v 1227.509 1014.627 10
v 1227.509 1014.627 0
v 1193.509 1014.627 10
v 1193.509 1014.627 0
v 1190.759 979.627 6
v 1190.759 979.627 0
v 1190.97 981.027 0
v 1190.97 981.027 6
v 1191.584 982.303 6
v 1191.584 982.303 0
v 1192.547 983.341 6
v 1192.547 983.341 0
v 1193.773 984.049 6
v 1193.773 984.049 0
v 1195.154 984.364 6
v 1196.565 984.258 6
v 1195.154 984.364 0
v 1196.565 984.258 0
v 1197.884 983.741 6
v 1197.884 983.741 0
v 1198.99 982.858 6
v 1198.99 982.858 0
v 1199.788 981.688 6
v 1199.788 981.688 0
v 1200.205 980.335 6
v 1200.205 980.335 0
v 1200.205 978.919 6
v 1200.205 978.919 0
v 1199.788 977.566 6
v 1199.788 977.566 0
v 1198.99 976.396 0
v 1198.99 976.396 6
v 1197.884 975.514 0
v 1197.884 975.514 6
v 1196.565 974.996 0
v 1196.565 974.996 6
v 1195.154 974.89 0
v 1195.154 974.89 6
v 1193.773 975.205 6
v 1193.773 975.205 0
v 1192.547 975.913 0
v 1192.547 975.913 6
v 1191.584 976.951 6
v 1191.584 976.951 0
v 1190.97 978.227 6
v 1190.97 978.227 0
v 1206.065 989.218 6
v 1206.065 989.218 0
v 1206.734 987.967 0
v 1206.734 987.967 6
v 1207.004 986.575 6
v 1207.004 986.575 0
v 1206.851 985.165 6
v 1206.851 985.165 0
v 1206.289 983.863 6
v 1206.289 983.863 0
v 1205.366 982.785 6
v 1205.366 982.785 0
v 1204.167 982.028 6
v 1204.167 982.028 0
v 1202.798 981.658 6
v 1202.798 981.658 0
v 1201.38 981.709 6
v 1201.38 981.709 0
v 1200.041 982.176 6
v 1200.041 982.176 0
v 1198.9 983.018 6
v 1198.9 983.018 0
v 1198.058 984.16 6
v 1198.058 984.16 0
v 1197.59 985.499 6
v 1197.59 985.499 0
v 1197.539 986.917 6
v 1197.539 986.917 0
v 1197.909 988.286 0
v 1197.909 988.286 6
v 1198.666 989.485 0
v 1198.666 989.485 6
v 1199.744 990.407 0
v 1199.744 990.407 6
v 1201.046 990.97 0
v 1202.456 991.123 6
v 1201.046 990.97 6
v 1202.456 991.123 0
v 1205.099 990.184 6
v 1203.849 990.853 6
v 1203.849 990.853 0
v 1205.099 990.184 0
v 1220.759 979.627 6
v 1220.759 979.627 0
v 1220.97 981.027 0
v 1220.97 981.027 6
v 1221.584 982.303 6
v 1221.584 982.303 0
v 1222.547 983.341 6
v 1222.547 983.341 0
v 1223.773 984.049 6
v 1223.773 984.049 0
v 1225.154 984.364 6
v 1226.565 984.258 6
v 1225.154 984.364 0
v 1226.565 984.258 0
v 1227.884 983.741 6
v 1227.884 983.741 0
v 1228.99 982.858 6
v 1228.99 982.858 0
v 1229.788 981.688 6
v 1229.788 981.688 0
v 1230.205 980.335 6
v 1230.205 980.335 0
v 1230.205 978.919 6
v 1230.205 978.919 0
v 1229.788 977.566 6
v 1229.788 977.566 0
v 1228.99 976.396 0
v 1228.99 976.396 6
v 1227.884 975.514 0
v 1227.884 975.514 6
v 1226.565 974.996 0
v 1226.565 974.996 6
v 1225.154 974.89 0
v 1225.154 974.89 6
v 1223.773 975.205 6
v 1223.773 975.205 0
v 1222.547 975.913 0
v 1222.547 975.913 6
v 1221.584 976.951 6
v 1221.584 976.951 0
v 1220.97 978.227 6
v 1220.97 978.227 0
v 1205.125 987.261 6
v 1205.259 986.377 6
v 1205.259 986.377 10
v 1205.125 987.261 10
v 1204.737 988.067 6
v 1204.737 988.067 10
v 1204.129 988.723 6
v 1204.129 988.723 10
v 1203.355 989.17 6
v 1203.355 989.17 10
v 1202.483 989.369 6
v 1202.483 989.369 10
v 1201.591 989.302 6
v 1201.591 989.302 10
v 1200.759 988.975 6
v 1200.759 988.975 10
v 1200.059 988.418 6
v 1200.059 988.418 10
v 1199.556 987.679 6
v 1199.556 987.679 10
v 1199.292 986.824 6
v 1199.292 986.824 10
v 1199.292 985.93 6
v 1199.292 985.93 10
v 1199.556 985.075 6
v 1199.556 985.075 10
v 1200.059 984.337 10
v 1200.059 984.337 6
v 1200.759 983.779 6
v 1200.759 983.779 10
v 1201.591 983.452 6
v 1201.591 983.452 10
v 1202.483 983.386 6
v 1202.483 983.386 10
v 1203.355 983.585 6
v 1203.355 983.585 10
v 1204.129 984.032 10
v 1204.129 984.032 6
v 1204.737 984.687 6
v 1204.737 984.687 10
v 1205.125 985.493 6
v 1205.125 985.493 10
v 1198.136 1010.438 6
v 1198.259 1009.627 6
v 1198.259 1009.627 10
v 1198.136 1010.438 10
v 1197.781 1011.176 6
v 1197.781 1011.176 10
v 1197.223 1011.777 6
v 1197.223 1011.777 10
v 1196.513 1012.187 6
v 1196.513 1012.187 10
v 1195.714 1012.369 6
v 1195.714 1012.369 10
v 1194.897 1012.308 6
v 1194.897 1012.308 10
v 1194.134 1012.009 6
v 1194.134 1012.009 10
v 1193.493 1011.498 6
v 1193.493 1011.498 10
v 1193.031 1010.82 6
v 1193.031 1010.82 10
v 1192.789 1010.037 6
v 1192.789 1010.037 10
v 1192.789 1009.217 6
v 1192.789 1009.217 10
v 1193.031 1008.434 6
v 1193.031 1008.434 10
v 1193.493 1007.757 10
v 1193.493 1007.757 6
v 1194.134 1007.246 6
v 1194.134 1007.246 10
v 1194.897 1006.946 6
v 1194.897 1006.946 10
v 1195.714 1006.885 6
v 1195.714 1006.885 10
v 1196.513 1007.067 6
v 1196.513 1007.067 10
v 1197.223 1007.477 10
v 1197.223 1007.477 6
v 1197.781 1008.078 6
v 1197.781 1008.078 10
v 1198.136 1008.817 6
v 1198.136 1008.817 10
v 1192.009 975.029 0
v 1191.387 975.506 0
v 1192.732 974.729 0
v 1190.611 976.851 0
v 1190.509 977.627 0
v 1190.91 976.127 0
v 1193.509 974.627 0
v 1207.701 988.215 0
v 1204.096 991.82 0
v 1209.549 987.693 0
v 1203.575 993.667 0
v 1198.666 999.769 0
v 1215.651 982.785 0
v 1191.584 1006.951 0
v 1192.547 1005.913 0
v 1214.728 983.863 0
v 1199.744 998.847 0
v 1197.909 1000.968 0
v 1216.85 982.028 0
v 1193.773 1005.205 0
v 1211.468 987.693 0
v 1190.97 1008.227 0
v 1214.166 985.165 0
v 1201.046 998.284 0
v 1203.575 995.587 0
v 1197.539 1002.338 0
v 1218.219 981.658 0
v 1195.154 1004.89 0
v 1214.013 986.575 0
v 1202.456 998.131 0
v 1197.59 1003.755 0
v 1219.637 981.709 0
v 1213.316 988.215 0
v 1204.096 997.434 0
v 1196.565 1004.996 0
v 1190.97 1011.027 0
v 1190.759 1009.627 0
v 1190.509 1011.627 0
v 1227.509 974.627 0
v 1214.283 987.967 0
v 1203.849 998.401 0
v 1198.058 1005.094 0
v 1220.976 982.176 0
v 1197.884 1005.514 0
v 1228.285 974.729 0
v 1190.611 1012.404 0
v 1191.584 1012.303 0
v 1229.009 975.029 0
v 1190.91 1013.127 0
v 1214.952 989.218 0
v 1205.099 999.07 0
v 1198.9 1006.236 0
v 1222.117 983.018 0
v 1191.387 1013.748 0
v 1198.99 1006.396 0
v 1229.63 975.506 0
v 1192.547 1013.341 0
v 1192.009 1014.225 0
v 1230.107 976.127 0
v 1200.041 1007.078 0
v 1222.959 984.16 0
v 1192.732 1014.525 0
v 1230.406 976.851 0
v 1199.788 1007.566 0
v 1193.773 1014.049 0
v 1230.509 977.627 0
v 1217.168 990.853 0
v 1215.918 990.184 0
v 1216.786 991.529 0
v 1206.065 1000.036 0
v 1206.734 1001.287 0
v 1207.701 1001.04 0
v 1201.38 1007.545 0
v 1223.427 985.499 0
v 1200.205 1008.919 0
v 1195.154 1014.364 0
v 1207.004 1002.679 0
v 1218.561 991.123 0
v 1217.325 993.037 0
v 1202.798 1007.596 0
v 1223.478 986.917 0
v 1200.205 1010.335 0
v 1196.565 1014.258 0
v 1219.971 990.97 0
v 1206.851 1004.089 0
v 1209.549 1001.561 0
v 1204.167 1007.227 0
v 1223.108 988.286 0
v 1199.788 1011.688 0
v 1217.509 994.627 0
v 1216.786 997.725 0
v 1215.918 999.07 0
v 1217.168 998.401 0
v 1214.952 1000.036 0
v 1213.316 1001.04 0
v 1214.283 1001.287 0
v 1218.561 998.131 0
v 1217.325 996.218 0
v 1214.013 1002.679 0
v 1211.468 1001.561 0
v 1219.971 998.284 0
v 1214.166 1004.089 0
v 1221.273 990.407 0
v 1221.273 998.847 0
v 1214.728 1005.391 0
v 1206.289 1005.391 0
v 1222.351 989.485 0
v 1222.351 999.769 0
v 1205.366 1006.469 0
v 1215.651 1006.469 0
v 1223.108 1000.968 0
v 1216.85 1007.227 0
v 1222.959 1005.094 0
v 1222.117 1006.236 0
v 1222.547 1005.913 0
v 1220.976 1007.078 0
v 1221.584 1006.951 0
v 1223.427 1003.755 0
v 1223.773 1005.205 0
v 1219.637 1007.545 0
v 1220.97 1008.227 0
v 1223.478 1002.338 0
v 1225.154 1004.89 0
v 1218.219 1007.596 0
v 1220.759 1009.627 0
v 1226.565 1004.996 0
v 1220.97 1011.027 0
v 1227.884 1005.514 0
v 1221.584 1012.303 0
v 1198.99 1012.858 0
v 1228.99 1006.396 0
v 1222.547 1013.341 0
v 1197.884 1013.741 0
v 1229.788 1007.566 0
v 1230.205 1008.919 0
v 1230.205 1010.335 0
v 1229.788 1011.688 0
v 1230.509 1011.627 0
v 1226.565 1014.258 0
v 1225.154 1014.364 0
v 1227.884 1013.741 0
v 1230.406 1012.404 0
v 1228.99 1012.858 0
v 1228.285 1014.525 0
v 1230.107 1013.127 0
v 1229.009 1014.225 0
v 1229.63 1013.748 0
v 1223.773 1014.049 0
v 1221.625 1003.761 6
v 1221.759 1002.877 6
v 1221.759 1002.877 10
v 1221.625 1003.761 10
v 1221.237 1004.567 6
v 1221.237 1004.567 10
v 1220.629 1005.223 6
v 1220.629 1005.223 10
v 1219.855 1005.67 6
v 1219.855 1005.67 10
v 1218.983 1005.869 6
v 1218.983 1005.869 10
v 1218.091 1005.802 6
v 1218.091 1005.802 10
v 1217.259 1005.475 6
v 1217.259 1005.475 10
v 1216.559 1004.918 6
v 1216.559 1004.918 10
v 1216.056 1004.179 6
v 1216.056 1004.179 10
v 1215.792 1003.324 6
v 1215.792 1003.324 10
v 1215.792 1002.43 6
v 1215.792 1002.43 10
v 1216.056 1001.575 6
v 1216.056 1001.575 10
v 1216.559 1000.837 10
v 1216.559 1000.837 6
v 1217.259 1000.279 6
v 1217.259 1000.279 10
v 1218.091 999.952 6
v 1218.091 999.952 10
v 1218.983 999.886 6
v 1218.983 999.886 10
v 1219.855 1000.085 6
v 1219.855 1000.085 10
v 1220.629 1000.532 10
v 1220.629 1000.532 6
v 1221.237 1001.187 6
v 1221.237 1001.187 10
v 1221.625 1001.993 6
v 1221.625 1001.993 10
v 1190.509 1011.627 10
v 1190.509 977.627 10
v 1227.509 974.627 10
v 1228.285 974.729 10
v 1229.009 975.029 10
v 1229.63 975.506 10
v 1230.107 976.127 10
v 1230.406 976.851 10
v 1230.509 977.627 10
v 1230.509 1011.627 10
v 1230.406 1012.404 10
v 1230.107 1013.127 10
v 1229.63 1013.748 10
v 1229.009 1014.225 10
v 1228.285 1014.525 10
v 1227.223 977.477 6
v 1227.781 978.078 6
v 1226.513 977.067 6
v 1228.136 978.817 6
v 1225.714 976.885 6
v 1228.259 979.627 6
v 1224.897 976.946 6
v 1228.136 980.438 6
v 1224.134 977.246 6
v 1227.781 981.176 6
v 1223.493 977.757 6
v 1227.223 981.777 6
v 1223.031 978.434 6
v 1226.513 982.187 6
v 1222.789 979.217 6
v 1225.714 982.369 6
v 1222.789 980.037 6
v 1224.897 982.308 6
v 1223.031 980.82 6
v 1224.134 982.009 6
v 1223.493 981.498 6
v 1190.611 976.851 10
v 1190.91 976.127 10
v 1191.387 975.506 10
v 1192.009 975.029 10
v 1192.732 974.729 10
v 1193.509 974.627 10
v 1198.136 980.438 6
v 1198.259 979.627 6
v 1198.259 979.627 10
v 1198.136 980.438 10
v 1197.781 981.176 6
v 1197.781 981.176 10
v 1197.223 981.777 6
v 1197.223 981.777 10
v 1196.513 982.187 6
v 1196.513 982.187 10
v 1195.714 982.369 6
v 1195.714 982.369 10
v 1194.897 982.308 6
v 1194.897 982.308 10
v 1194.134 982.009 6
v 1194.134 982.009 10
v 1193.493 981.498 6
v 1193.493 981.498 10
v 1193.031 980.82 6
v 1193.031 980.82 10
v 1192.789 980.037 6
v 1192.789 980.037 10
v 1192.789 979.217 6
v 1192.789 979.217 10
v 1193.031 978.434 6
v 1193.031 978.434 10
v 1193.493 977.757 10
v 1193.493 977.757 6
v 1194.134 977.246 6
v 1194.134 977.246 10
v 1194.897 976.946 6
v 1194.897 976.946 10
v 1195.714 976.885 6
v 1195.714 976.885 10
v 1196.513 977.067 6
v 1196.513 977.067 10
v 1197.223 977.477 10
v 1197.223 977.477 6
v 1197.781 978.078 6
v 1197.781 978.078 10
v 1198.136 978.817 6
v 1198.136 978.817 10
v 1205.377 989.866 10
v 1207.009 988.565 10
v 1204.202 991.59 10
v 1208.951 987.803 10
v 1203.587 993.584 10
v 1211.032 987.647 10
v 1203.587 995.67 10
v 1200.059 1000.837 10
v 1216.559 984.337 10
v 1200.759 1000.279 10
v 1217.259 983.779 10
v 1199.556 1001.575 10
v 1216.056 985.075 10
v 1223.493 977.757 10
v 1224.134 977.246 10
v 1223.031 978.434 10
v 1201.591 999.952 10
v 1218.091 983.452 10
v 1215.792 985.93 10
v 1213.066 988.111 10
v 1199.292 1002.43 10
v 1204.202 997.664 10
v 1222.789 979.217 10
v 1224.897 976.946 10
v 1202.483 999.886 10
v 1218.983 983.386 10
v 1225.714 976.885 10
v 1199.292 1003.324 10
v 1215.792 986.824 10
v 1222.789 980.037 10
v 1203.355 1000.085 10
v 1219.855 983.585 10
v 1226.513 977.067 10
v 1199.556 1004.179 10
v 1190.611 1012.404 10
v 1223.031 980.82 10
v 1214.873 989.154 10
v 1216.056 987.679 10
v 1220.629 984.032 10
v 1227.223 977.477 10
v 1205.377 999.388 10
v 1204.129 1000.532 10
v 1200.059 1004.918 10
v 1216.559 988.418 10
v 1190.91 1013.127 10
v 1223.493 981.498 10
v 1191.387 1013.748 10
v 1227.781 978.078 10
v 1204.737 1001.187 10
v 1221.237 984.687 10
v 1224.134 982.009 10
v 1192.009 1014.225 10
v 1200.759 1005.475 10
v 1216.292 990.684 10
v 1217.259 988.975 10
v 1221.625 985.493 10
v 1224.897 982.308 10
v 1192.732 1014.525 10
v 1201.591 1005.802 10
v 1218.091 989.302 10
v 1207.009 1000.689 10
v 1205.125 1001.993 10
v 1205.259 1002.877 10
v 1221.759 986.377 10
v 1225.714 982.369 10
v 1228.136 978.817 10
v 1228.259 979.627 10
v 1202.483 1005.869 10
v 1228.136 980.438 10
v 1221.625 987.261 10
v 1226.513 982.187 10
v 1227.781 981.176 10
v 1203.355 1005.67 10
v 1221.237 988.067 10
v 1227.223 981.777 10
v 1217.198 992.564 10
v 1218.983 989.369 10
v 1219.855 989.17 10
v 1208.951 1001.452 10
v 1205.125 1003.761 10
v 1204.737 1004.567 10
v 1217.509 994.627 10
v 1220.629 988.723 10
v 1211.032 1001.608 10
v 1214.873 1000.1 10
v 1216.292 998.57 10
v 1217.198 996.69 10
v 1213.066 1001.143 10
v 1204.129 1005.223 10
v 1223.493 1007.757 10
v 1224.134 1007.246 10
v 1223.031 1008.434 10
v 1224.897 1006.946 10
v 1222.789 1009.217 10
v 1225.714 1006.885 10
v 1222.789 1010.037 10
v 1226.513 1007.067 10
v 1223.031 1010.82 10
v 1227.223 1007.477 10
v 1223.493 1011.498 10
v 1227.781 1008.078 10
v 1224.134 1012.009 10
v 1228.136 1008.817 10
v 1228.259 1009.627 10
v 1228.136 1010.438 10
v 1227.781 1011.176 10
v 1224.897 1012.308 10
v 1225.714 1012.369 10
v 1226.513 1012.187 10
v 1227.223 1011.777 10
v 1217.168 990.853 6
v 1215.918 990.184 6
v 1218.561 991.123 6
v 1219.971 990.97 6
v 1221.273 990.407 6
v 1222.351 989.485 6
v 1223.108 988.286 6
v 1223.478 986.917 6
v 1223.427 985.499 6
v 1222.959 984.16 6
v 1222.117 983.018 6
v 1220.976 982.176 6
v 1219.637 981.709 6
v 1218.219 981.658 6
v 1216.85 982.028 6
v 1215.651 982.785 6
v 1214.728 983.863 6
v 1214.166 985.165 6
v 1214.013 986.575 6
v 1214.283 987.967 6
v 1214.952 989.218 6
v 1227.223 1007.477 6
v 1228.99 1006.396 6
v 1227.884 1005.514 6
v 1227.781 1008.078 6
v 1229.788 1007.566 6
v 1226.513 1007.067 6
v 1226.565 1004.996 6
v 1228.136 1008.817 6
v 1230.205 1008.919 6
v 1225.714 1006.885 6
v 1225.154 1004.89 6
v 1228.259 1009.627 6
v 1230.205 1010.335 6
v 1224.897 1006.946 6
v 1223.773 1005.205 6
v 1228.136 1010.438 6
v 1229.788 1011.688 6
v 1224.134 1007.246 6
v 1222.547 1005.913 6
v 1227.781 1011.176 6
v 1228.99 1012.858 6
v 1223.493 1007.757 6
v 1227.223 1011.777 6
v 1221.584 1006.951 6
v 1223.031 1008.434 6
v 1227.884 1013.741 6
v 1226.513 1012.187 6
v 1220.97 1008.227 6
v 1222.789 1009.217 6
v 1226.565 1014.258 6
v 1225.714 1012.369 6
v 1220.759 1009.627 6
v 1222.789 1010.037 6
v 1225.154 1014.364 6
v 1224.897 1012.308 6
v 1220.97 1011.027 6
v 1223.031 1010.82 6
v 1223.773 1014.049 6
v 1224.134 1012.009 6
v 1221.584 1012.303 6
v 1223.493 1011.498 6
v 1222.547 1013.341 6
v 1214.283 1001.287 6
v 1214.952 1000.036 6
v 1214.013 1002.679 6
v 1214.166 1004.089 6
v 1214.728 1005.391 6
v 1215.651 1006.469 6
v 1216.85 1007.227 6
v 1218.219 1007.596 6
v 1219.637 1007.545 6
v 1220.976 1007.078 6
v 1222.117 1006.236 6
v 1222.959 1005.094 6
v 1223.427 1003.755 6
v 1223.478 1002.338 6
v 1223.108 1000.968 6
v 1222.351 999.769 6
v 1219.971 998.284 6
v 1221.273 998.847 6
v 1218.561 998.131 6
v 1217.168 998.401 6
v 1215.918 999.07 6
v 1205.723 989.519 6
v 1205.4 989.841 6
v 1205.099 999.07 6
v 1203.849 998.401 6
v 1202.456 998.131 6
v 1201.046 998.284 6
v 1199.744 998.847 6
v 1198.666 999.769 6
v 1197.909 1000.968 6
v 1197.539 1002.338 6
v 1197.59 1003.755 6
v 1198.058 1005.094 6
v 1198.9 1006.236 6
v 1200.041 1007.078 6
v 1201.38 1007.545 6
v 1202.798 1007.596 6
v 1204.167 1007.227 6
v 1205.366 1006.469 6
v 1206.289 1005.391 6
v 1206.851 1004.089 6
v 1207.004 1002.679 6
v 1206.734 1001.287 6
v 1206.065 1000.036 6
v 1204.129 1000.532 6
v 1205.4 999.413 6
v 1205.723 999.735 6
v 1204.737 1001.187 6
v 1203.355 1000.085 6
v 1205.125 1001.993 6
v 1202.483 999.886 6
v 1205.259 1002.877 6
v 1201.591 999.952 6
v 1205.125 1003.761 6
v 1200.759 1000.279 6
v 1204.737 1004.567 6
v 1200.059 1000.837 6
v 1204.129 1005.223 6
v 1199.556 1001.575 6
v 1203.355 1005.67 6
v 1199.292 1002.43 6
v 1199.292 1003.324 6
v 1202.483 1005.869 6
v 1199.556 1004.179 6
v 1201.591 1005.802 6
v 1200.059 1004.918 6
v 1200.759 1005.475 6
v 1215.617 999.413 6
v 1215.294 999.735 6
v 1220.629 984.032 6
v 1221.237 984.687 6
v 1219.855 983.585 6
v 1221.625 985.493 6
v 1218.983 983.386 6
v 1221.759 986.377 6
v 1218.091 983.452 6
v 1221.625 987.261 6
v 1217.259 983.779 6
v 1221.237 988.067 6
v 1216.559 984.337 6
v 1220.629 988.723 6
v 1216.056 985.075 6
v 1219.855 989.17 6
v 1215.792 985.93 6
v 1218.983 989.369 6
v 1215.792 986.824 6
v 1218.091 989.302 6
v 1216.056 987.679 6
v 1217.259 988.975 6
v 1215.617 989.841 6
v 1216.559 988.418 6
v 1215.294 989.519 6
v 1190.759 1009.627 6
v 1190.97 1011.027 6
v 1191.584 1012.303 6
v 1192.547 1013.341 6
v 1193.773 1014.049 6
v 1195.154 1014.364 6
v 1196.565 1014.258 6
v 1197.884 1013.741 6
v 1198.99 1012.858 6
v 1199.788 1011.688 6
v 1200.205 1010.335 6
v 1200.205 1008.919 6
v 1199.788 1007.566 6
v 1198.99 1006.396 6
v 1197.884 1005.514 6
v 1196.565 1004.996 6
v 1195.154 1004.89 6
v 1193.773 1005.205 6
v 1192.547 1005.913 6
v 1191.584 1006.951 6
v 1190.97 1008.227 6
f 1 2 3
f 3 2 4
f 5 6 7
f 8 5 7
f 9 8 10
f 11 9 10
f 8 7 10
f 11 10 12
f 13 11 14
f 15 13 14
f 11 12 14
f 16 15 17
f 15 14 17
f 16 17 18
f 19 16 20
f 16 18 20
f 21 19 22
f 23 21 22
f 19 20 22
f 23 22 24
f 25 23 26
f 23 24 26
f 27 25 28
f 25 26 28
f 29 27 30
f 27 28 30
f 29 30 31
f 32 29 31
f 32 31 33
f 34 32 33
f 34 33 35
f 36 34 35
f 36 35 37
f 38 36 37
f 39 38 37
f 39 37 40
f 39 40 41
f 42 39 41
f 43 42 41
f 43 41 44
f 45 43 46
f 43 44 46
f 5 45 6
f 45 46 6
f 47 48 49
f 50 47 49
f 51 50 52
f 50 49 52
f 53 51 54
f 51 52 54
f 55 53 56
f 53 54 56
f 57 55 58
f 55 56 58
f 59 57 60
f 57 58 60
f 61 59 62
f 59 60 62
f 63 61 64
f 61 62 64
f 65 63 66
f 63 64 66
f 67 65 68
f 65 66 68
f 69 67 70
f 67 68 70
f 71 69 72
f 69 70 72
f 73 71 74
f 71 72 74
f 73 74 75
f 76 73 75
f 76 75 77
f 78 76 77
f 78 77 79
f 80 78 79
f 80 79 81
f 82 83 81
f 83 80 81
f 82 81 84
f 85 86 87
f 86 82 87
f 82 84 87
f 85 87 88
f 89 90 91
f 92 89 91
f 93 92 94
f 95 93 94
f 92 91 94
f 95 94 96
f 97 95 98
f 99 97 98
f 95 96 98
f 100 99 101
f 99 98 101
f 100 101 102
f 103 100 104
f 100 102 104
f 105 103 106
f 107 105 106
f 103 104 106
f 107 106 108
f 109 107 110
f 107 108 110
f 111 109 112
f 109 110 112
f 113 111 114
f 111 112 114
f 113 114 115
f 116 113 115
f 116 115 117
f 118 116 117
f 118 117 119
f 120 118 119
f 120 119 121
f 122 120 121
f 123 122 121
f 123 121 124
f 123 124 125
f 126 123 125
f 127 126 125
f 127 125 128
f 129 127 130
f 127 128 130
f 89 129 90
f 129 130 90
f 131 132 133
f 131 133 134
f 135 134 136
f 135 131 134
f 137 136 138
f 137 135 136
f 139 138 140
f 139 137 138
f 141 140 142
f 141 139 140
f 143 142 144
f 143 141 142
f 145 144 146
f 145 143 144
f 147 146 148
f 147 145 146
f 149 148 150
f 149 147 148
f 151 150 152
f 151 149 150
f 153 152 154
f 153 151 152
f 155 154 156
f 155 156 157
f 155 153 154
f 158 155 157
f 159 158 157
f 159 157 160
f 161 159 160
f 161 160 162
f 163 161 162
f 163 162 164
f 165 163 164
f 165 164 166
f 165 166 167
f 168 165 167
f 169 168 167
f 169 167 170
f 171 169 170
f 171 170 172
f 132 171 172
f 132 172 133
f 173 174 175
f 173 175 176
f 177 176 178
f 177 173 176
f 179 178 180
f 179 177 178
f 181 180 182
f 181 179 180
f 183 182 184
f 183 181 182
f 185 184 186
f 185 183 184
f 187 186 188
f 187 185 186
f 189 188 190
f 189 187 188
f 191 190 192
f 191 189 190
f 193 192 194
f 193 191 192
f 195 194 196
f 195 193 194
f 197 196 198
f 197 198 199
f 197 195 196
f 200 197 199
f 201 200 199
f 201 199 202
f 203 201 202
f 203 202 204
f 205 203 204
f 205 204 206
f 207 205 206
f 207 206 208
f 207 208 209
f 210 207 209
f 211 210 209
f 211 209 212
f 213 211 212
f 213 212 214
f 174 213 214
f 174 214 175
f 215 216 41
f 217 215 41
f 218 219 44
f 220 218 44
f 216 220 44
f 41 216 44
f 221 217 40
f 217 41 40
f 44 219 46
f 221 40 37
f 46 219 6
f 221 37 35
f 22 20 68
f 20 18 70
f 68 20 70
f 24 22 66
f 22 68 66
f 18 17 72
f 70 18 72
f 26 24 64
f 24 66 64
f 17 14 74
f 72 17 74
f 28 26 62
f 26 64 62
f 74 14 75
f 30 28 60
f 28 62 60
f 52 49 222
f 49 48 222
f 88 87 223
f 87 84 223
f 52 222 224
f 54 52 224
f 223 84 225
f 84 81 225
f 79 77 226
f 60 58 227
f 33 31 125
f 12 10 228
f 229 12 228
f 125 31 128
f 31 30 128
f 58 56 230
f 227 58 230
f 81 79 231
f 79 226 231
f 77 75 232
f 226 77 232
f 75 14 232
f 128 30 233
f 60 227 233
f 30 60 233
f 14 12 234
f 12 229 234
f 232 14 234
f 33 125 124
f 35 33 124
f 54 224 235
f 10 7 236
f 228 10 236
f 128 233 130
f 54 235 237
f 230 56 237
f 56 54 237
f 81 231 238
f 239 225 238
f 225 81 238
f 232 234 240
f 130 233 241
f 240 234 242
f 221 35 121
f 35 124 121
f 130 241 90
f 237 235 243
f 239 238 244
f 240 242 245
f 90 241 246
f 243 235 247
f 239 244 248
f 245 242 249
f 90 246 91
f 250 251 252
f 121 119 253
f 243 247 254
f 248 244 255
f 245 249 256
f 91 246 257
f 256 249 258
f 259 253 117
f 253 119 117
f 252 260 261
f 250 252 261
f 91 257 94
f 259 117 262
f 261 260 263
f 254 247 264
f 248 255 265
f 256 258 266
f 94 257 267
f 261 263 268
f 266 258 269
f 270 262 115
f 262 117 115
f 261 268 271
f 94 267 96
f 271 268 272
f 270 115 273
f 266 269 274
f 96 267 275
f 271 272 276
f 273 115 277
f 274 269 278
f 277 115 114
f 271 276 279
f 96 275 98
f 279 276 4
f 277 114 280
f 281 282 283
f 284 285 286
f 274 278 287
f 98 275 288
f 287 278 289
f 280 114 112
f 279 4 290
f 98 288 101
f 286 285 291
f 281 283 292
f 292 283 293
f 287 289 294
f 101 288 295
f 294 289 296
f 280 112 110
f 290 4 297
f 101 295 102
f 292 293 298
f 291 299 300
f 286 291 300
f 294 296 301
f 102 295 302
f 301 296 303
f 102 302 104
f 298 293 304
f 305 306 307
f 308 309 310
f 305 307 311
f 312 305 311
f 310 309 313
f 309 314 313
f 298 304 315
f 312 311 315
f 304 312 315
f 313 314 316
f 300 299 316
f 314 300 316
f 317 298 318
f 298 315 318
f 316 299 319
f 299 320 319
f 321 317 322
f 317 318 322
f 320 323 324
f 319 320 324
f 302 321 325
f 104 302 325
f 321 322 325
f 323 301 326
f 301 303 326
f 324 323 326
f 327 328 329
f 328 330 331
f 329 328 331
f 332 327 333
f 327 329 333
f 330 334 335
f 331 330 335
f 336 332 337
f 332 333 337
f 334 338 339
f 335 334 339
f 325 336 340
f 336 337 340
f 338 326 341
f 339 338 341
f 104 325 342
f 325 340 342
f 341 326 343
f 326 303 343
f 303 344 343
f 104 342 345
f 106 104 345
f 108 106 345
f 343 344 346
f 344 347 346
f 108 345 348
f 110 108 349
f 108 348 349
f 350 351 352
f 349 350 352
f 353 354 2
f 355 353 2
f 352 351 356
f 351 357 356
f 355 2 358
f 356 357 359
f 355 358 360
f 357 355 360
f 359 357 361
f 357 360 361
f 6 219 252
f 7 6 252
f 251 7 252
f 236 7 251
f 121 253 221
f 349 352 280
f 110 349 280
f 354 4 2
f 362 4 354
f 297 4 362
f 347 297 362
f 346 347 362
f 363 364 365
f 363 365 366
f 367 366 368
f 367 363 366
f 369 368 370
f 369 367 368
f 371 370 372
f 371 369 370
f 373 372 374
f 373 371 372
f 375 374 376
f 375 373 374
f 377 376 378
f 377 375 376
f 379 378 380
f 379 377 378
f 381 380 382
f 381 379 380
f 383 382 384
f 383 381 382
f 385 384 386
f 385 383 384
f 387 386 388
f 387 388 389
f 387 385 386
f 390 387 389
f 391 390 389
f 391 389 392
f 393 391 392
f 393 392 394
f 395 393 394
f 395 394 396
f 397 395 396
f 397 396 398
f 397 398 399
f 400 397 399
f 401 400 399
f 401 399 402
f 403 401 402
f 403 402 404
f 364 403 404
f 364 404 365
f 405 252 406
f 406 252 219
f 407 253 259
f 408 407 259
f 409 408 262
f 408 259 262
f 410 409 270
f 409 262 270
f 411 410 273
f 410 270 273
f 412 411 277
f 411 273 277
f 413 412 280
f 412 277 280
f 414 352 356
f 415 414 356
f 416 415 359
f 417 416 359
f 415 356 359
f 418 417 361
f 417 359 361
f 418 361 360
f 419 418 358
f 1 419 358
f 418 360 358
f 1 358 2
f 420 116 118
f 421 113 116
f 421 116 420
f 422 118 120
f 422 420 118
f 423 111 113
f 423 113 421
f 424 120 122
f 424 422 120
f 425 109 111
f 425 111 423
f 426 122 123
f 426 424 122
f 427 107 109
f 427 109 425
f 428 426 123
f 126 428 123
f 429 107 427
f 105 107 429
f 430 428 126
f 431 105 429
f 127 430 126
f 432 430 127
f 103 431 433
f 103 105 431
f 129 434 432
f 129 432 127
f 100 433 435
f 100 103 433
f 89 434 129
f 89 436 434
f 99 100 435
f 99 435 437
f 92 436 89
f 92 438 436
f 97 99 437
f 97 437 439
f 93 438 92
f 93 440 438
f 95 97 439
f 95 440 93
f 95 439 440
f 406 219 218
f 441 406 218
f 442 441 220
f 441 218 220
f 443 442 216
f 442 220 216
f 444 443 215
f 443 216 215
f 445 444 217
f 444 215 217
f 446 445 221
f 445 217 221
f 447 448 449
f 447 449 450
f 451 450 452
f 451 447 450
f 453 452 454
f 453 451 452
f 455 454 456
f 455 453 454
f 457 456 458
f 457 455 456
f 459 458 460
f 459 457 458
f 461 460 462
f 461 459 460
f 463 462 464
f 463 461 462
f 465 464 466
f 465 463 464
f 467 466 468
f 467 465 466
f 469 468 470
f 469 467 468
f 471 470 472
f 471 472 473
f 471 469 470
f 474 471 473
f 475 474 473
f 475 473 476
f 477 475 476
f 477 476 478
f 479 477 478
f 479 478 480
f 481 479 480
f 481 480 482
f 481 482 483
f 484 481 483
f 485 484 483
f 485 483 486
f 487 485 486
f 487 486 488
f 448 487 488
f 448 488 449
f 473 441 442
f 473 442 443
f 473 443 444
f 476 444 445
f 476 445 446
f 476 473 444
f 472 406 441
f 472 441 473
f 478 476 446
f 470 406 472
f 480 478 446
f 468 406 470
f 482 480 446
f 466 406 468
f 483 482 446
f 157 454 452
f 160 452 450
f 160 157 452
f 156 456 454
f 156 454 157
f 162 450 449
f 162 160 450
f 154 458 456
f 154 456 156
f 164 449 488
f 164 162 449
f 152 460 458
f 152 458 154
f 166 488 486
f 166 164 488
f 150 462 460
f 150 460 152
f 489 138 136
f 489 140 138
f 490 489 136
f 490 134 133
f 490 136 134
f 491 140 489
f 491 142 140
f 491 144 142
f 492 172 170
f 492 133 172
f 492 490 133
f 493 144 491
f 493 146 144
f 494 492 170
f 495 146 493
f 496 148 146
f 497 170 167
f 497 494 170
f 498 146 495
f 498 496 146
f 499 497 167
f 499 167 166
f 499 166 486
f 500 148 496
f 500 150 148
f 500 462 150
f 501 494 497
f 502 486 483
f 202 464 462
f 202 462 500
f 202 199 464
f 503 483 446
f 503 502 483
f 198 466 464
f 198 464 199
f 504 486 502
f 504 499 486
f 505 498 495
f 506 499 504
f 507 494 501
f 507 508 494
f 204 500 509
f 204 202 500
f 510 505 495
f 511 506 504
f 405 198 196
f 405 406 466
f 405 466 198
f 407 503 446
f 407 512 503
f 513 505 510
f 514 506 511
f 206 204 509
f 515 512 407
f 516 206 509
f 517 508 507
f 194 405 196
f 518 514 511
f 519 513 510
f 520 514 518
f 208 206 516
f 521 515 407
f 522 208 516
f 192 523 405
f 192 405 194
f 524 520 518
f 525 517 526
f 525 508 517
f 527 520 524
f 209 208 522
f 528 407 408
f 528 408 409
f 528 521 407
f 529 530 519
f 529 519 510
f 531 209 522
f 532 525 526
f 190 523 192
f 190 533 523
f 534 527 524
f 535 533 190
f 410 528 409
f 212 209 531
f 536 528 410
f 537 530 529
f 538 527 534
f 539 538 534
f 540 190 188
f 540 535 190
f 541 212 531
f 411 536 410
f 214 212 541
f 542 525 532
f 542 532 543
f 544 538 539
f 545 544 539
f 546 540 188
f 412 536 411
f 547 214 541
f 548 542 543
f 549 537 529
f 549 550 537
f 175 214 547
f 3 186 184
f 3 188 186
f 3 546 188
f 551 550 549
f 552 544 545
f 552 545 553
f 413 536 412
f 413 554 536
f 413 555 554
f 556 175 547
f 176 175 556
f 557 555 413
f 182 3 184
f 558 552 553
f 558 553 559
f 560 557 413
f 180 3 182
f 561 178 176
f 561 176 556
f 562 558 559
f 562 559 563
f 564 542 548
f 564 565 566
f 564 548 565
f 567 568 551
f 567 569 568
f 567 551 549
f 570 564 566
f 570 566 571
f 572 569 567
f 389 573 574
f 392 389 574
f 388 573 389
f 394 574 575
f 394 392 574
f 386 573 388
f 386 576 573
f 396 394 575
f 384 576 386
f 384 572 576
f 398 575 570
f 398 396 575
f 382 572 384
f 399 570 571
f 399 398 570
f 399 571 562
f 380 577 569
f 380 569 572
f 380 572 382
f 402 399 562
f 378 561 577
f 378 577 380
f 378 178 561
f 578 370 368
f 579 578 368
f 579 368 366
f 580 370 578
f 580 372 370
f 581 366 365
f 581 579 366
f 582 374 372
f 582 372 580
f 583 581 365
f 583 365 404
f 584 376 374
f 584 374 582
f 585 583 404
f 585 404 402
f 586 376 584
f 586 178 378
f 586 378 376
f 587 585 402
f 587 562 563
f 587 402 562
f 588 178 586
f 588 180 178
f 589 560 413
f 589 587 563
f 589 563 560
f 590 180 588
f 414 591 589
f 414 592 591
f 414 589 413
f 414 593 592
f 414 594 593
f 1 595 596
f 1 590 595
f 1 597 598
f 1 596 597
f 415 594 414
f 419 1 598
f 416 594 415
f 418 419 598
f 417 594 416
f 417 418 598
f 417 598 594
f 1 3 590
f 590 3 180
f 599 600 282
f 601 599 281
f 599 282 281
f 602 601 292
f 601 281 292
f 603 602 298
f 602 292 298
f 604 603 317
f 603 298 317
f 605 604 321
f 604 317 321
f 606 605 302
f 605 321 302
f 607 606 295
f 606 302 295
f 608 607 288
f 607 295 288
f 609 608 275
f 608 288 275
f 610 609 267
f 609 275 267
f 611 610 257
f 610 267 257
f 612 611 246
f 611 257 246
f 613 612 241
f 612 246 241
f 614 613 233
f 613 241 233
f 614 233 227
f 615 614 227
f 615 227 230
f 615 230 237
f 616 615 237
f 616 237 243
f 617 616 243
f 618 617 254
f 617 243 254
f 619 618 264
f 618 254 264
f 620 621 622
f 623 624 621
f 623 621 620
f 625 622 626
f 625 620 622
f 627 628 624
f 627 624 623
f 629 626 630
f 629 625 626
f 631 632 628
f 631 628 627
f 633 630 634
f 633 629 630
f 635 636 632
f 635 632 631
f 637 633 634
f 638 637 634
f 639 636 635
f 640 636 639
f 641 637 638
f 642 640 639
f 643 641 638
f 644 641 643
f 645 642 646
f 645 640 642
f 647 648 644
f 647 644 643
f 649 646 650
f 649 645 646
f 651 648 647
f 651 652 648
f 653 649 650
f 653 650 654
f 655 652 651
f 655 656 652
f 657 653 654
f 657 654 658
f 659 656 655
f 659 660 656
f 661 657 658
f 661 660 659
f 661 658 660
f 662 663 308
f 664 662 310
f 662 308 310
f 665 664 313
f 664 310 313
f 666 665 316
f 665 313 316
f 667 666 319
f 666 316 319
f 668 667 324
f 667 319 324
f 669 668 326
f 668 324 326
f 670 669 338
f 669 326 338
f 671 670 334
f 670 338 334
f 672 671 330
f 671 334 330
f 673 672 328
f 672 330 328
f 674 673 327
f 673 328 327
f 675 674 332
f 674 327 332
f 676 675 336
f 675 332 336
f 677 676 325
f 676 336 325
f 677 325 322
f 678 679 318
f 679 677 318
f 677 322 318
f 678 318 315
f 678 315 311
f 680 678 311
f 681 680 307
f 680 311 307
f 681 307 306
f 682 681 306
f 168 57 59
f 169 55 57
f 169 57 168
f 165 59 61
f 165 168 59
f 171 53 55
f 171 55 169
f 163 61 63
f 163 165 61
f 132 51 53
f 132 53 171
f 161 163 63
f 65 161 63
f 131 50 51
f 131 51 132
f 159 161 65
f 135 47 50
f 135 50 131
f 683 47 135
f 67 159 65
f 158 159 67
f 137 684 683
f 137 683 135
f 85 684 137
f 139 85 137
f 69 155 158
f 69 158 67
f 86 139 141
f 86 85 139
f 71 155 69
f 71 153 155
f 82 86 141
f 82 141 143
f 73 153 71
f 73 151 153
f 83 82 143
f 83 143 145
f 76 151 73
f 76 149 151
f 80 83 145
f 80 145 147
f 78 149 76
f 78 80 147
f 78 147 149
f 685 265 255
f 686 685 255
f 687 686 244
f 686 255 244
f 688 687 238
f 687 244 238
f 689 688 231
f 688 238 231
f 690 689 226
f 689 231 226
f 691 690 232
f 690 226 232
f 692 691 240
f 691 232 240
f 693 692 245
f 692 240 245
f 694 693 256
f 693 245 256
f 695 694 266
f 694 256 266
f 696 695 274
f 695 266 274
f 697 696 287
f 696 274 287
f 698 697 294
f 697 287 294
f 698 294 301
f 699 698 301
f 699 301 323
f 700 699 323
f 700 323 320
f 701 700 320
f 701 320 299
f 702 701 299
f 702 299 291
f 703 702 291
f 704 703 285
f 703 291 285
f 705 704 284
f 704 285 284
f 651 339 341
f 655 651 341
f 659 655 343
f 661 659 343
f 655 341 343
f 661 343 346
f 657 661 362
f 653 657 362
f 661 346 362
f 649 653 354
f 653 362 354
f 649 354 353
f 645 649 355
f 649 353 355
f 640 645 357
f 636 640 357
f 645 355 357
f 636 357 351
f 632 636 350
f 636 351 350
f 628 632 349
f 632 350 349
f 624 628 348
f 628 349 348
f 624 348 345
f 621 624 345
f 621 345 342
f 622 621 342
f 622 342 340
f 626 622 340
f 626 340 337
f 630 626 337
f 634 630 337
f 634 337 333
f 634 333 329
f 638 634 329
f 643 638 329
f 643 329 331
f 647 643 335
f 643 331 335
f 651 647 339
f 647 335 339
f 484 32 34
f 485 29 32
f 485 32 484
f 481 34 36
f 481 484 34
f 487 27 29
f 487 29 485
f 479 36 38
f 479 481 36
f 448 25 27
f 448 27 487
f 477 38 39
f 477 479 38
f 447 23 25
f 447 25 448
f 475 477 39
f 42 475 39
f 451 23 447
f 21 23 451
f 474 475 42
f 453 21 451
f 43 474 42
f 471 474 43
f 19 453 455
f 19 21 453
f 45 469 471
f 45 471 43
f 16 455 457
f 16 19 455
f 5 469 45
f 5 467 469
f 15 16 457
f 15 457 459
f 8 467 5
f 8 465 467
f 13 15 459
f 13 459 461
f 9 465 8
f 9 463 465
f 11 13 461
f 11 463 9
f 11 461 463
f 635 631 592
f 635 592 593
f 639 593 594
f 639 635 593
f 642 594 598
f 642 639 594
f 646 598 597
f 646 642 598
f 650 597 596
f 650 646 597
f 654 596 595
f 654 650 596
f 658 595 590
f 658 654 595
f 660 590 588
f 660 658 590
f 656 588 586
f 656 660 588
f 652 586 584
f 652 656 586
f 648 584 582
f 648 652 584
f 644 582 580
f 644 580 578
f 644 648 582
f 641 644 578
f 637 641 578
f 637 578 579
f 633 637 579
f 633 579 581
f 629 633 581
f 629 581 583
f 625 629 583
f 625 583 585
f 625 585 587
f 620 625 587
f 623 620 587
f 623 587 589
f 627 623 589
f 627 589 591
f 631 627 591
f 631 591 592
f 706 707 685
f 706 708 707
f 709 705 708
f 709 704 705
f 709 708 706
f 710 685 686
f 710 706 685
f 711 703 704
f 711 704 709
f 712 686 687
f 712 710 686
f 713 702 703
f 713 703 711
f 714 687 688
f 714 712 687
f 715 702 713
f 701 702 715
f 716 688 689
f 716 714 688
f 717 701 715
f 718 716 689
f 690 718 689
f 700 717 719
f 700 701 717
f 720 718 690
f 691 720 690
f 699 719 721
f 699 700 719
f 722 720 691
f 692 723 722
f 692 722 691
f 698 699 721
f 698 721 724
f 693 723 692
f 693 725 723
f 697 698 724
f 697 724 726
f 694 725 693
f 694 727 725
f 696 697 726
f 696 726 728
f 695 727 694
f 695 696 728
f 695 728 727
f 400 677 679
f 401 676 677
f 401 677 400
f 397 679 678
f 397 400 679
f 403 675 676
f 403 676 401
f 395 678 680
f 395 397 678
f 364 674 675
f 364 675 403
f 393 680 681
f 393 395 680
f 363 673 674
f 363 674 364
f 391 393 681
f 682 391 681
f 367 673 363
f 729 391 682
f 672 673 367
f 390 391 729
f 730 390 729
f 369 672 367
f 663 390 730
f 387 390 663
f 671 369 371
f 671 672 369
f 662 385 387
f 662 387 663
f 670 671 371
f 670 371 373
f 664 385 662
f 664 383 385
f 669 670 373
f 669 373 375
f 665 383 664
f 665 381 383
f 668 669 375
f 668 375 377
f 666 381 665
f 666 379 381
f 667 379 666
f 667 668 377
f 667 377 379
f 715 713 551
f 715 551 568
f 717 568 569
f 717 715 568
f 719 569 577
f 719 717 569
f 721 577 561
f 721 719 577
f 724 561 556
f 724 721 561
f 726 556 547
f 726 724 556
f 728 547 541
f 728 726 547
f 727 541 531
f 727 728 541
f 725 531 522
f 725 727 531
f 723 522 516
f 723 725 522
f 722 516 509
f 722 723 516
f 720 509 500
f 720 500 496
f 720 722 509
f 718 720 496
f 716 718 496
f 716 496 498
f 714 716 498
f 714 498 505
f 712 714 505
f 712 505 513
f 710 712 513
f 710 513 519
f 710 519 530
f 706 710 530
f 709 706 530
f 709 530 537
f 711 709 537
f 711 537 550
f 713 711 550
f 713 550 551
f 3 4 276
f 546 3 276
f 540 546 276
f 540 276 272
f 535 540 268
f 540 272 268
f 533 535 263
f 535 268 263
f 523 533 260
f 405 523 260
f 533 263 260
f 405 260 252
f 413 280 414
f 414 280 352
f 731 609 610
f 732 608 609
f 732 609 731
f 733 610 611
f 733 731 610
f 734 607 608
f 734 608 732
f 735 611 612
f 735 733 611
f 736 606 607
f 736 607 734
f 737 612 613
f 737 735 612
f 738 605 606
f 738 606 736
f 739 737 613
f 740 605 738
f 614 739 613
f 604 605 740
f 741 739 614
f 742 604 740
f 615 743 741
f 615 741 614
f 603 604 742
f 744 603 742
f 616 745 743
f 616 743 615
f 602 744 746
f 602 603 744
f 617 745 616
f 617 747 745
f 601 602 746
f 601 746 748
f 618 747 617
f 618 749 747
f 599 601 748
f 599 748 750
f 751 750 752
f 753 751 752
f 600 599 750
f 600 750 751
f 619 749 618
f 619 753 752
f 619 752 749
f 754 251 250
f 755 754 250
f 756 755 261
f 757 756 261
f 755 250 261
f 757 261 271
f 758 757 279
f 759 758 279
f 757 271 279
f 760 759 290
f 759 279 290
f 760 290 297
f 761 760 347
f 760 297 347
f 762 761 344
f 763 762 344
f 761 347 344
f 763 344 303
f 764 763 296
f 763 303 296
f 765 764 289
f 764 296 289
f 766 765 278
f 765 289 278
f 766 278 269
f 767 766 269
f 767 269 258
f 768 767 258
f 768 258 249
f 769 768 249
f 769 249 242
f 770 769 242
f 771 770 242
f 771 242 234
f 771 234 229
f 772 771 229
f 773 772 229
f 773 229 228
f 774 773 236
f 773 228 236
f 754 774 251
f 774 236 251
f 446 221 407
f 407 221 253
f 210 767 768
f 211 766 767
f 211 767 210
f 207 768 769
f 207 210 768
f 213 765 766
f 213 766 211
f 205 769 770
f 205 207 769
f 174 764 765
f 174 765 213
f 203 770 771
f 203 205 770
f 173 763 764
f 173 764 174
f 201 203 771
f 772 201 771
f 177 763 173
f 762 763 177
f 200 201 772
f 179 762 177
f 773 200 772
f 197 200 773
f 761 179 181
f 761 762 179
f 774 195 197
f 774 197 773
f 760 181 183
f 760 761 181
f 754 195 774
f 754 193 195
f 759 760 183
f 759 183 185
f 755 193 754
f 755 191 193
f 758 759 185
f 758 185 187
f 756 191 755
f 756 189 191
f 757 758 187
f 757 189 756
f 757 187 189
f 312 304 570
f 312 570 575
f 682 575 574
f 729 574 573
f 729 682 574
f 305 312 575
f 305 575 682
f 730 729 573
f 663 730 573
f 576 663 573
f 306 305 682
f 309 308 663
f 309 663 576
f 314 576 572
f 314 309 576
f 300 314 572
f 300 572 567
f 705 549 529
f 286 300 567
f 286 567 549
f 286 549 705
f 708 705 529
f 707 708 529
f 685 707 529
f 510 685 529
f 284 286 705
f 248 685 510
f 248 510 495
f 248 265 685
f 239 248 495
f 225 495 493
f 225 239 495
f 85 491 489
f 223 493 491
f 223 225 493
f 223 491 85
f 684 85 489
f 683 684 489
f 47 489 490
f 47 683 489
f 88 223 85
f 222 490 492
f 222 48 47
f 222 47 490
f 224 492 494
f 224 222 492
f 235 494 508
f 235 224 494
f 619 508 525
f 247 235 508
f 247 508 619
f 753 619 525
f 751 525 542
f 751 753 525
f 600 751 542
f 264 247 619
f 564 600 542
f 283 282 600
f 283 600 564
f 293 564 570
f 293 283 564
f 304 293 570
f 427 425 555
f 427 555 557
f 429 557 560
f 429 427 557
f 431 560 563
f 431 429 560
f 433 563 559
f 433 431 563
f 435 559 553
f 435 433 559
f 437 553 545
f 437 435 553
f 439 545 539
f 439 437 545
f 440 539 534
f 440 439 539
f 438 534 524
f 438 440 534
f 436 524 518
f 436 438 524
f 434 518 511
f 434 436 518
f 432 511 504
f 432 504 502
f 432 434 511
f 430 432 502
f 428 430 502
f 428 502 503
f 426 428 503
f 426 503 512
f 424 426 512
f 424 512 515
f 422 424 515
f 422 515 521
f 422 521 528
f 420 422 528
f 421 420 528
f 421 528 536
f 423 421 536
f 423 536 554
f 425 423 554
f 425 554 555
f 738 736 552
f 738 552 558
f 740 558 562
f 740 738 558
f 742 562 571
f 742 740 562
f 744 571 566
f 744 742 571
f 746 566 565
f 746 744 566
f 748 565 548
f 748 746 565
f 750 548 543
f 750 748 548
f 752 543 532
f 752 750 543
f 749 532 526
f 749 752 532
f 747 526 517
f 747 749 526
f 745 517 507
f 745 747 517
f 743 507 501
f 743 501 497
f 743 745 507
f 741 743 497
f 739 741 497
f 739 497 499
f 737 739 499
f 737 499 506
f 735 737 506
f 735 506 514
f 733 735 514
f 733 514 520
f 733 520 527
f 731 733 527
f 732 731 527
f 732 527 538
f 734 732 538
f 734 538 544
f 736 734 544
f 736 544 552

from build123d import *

# Parameters (mm, degrees)
SKETCH_1_R          = 3
SKETCH_1_R_2        = 7
SKETCH_1_R_3        = 2.75
EXTRUDE_1_DEPTH     = 10
SKETCH_2_R          = 4.75
CUT_EXTRUDE_2_DEPTH = 6


with BuildPart() as part:
    # 草图1 → 拉伸1 (new body)
    with BuildSketch(Plane.XY):
        with BuildLine():
            Line((1190.508500062, 1011.627141179), (1190.508500062, 977.627141179))
            ThreePointArc((1190.508500062, 977.627141179), (1191.387179719, 975.505820835), (1193.508500062, 974.627141179))
            Line((1193.508500062, 974.627141179), (1227.508500062, 974.627141179))
            ThreePointArc((1227.508500062, 974.627141179), (1229.629820406, 975.505820835), (1230.508500062, 977.627141179))
            Line((1230.508500062, 977.627141179), (1230.508500062, 1011.627141179))
            ThreePointArc((1230.508500062, 1011.627141179), (1229.629820406, 1013.748461522), (1227.508500062, 1014.627141179))
            Line((1227.508500062, 1014.627141179), (1193.508500062, 1014.627141179))
            ThreePointArc((1193.508500062, 1014.627141179), (1191.387179719, 1013.748461522), (1190.508500062, 1011.627141179))
        make_face()
        with Locations((1218.758500062, 1002.877141179)):
            Circle(SKETCH_1_R, mode=Mode.SUBTRACT)
        with Locations((1218.758500062, 986.377141179)):
            Circle(SKETCH_1_R, mode=Mode.SUBTRACT)
        with Locations((1202.258500062, 1002.877141179)):
            Circle(SKETCH_1_R, mode=Mode.SUBTRACT)
        with Locations((1202.258500062, 986.377141179)):
            Circle(SKETCH_1_R, mode=Mode.SUBTRACT)
        with Locations((1210.508500062, 994.627141179)):
            Circle(SKETCH_1_R_2, mode=Mode.SUBTRACT)
        with Locations((1195.508500062, 1009.627141179)):
            Circle(SKETCH_1_R_3, mode=Mode.SUBTRACT)
        with Locations((1225.508500062, 1009.627141179)):
            Circle(SKETCH_1_R_3, mode=Mode.SUBTRACT)
        with Locations((1225.508500062, 979.627141179)):
            Circle(SKETCH_1_R_3, mode=Mode.SUBTRACT)
        with Locations((1195.508500062, 979.627141179)):
            Circle(SKETCH_1_R_3, mode=Mode.SUBTRACT)
    extrude(amount=EXTRUDE_1_DEPTH)

    # 草图2 → 拉伸2 (cut)
    with BuildSketch(Plane(origin=(0, 0, 0), x_dir=(-1, 0, 0), z_dir=(0, 0, -1))):
        with Locations((-1225.508500062, 1009.627141179)):
            Circle(SKETCH_2_R)
        with Locations((-1195.508500062, 1009.627141179)):
            Circle(SKETCH_2_R)
        with Locations((-1225.508500062, 979.627141179)):
            Circle(SKETCH_2_R)
        with Locations((-1195.508500062, 979.627141179)):
            Circle(SKETCH_2_R)
        with Locations((-1218.758500062, 1002.877141179)):
            Circle(SKETCH_2_R)
        with Locations((-1202.258500062, 1002.877141179)):
            Circle(SKETCH_2_R)
        with Locations((-1218.758500062, 986.377141179)):
            Circle(SKETCH_2_R)
        with Locations((-1202.258500062, 986.377141179)):
            Circle(SKETCH_2_R)
    extrude(amount=-CUT_EXTRUDE_2_DEPTH, mode=Mode.SUBTRACT)


solid = part.part
